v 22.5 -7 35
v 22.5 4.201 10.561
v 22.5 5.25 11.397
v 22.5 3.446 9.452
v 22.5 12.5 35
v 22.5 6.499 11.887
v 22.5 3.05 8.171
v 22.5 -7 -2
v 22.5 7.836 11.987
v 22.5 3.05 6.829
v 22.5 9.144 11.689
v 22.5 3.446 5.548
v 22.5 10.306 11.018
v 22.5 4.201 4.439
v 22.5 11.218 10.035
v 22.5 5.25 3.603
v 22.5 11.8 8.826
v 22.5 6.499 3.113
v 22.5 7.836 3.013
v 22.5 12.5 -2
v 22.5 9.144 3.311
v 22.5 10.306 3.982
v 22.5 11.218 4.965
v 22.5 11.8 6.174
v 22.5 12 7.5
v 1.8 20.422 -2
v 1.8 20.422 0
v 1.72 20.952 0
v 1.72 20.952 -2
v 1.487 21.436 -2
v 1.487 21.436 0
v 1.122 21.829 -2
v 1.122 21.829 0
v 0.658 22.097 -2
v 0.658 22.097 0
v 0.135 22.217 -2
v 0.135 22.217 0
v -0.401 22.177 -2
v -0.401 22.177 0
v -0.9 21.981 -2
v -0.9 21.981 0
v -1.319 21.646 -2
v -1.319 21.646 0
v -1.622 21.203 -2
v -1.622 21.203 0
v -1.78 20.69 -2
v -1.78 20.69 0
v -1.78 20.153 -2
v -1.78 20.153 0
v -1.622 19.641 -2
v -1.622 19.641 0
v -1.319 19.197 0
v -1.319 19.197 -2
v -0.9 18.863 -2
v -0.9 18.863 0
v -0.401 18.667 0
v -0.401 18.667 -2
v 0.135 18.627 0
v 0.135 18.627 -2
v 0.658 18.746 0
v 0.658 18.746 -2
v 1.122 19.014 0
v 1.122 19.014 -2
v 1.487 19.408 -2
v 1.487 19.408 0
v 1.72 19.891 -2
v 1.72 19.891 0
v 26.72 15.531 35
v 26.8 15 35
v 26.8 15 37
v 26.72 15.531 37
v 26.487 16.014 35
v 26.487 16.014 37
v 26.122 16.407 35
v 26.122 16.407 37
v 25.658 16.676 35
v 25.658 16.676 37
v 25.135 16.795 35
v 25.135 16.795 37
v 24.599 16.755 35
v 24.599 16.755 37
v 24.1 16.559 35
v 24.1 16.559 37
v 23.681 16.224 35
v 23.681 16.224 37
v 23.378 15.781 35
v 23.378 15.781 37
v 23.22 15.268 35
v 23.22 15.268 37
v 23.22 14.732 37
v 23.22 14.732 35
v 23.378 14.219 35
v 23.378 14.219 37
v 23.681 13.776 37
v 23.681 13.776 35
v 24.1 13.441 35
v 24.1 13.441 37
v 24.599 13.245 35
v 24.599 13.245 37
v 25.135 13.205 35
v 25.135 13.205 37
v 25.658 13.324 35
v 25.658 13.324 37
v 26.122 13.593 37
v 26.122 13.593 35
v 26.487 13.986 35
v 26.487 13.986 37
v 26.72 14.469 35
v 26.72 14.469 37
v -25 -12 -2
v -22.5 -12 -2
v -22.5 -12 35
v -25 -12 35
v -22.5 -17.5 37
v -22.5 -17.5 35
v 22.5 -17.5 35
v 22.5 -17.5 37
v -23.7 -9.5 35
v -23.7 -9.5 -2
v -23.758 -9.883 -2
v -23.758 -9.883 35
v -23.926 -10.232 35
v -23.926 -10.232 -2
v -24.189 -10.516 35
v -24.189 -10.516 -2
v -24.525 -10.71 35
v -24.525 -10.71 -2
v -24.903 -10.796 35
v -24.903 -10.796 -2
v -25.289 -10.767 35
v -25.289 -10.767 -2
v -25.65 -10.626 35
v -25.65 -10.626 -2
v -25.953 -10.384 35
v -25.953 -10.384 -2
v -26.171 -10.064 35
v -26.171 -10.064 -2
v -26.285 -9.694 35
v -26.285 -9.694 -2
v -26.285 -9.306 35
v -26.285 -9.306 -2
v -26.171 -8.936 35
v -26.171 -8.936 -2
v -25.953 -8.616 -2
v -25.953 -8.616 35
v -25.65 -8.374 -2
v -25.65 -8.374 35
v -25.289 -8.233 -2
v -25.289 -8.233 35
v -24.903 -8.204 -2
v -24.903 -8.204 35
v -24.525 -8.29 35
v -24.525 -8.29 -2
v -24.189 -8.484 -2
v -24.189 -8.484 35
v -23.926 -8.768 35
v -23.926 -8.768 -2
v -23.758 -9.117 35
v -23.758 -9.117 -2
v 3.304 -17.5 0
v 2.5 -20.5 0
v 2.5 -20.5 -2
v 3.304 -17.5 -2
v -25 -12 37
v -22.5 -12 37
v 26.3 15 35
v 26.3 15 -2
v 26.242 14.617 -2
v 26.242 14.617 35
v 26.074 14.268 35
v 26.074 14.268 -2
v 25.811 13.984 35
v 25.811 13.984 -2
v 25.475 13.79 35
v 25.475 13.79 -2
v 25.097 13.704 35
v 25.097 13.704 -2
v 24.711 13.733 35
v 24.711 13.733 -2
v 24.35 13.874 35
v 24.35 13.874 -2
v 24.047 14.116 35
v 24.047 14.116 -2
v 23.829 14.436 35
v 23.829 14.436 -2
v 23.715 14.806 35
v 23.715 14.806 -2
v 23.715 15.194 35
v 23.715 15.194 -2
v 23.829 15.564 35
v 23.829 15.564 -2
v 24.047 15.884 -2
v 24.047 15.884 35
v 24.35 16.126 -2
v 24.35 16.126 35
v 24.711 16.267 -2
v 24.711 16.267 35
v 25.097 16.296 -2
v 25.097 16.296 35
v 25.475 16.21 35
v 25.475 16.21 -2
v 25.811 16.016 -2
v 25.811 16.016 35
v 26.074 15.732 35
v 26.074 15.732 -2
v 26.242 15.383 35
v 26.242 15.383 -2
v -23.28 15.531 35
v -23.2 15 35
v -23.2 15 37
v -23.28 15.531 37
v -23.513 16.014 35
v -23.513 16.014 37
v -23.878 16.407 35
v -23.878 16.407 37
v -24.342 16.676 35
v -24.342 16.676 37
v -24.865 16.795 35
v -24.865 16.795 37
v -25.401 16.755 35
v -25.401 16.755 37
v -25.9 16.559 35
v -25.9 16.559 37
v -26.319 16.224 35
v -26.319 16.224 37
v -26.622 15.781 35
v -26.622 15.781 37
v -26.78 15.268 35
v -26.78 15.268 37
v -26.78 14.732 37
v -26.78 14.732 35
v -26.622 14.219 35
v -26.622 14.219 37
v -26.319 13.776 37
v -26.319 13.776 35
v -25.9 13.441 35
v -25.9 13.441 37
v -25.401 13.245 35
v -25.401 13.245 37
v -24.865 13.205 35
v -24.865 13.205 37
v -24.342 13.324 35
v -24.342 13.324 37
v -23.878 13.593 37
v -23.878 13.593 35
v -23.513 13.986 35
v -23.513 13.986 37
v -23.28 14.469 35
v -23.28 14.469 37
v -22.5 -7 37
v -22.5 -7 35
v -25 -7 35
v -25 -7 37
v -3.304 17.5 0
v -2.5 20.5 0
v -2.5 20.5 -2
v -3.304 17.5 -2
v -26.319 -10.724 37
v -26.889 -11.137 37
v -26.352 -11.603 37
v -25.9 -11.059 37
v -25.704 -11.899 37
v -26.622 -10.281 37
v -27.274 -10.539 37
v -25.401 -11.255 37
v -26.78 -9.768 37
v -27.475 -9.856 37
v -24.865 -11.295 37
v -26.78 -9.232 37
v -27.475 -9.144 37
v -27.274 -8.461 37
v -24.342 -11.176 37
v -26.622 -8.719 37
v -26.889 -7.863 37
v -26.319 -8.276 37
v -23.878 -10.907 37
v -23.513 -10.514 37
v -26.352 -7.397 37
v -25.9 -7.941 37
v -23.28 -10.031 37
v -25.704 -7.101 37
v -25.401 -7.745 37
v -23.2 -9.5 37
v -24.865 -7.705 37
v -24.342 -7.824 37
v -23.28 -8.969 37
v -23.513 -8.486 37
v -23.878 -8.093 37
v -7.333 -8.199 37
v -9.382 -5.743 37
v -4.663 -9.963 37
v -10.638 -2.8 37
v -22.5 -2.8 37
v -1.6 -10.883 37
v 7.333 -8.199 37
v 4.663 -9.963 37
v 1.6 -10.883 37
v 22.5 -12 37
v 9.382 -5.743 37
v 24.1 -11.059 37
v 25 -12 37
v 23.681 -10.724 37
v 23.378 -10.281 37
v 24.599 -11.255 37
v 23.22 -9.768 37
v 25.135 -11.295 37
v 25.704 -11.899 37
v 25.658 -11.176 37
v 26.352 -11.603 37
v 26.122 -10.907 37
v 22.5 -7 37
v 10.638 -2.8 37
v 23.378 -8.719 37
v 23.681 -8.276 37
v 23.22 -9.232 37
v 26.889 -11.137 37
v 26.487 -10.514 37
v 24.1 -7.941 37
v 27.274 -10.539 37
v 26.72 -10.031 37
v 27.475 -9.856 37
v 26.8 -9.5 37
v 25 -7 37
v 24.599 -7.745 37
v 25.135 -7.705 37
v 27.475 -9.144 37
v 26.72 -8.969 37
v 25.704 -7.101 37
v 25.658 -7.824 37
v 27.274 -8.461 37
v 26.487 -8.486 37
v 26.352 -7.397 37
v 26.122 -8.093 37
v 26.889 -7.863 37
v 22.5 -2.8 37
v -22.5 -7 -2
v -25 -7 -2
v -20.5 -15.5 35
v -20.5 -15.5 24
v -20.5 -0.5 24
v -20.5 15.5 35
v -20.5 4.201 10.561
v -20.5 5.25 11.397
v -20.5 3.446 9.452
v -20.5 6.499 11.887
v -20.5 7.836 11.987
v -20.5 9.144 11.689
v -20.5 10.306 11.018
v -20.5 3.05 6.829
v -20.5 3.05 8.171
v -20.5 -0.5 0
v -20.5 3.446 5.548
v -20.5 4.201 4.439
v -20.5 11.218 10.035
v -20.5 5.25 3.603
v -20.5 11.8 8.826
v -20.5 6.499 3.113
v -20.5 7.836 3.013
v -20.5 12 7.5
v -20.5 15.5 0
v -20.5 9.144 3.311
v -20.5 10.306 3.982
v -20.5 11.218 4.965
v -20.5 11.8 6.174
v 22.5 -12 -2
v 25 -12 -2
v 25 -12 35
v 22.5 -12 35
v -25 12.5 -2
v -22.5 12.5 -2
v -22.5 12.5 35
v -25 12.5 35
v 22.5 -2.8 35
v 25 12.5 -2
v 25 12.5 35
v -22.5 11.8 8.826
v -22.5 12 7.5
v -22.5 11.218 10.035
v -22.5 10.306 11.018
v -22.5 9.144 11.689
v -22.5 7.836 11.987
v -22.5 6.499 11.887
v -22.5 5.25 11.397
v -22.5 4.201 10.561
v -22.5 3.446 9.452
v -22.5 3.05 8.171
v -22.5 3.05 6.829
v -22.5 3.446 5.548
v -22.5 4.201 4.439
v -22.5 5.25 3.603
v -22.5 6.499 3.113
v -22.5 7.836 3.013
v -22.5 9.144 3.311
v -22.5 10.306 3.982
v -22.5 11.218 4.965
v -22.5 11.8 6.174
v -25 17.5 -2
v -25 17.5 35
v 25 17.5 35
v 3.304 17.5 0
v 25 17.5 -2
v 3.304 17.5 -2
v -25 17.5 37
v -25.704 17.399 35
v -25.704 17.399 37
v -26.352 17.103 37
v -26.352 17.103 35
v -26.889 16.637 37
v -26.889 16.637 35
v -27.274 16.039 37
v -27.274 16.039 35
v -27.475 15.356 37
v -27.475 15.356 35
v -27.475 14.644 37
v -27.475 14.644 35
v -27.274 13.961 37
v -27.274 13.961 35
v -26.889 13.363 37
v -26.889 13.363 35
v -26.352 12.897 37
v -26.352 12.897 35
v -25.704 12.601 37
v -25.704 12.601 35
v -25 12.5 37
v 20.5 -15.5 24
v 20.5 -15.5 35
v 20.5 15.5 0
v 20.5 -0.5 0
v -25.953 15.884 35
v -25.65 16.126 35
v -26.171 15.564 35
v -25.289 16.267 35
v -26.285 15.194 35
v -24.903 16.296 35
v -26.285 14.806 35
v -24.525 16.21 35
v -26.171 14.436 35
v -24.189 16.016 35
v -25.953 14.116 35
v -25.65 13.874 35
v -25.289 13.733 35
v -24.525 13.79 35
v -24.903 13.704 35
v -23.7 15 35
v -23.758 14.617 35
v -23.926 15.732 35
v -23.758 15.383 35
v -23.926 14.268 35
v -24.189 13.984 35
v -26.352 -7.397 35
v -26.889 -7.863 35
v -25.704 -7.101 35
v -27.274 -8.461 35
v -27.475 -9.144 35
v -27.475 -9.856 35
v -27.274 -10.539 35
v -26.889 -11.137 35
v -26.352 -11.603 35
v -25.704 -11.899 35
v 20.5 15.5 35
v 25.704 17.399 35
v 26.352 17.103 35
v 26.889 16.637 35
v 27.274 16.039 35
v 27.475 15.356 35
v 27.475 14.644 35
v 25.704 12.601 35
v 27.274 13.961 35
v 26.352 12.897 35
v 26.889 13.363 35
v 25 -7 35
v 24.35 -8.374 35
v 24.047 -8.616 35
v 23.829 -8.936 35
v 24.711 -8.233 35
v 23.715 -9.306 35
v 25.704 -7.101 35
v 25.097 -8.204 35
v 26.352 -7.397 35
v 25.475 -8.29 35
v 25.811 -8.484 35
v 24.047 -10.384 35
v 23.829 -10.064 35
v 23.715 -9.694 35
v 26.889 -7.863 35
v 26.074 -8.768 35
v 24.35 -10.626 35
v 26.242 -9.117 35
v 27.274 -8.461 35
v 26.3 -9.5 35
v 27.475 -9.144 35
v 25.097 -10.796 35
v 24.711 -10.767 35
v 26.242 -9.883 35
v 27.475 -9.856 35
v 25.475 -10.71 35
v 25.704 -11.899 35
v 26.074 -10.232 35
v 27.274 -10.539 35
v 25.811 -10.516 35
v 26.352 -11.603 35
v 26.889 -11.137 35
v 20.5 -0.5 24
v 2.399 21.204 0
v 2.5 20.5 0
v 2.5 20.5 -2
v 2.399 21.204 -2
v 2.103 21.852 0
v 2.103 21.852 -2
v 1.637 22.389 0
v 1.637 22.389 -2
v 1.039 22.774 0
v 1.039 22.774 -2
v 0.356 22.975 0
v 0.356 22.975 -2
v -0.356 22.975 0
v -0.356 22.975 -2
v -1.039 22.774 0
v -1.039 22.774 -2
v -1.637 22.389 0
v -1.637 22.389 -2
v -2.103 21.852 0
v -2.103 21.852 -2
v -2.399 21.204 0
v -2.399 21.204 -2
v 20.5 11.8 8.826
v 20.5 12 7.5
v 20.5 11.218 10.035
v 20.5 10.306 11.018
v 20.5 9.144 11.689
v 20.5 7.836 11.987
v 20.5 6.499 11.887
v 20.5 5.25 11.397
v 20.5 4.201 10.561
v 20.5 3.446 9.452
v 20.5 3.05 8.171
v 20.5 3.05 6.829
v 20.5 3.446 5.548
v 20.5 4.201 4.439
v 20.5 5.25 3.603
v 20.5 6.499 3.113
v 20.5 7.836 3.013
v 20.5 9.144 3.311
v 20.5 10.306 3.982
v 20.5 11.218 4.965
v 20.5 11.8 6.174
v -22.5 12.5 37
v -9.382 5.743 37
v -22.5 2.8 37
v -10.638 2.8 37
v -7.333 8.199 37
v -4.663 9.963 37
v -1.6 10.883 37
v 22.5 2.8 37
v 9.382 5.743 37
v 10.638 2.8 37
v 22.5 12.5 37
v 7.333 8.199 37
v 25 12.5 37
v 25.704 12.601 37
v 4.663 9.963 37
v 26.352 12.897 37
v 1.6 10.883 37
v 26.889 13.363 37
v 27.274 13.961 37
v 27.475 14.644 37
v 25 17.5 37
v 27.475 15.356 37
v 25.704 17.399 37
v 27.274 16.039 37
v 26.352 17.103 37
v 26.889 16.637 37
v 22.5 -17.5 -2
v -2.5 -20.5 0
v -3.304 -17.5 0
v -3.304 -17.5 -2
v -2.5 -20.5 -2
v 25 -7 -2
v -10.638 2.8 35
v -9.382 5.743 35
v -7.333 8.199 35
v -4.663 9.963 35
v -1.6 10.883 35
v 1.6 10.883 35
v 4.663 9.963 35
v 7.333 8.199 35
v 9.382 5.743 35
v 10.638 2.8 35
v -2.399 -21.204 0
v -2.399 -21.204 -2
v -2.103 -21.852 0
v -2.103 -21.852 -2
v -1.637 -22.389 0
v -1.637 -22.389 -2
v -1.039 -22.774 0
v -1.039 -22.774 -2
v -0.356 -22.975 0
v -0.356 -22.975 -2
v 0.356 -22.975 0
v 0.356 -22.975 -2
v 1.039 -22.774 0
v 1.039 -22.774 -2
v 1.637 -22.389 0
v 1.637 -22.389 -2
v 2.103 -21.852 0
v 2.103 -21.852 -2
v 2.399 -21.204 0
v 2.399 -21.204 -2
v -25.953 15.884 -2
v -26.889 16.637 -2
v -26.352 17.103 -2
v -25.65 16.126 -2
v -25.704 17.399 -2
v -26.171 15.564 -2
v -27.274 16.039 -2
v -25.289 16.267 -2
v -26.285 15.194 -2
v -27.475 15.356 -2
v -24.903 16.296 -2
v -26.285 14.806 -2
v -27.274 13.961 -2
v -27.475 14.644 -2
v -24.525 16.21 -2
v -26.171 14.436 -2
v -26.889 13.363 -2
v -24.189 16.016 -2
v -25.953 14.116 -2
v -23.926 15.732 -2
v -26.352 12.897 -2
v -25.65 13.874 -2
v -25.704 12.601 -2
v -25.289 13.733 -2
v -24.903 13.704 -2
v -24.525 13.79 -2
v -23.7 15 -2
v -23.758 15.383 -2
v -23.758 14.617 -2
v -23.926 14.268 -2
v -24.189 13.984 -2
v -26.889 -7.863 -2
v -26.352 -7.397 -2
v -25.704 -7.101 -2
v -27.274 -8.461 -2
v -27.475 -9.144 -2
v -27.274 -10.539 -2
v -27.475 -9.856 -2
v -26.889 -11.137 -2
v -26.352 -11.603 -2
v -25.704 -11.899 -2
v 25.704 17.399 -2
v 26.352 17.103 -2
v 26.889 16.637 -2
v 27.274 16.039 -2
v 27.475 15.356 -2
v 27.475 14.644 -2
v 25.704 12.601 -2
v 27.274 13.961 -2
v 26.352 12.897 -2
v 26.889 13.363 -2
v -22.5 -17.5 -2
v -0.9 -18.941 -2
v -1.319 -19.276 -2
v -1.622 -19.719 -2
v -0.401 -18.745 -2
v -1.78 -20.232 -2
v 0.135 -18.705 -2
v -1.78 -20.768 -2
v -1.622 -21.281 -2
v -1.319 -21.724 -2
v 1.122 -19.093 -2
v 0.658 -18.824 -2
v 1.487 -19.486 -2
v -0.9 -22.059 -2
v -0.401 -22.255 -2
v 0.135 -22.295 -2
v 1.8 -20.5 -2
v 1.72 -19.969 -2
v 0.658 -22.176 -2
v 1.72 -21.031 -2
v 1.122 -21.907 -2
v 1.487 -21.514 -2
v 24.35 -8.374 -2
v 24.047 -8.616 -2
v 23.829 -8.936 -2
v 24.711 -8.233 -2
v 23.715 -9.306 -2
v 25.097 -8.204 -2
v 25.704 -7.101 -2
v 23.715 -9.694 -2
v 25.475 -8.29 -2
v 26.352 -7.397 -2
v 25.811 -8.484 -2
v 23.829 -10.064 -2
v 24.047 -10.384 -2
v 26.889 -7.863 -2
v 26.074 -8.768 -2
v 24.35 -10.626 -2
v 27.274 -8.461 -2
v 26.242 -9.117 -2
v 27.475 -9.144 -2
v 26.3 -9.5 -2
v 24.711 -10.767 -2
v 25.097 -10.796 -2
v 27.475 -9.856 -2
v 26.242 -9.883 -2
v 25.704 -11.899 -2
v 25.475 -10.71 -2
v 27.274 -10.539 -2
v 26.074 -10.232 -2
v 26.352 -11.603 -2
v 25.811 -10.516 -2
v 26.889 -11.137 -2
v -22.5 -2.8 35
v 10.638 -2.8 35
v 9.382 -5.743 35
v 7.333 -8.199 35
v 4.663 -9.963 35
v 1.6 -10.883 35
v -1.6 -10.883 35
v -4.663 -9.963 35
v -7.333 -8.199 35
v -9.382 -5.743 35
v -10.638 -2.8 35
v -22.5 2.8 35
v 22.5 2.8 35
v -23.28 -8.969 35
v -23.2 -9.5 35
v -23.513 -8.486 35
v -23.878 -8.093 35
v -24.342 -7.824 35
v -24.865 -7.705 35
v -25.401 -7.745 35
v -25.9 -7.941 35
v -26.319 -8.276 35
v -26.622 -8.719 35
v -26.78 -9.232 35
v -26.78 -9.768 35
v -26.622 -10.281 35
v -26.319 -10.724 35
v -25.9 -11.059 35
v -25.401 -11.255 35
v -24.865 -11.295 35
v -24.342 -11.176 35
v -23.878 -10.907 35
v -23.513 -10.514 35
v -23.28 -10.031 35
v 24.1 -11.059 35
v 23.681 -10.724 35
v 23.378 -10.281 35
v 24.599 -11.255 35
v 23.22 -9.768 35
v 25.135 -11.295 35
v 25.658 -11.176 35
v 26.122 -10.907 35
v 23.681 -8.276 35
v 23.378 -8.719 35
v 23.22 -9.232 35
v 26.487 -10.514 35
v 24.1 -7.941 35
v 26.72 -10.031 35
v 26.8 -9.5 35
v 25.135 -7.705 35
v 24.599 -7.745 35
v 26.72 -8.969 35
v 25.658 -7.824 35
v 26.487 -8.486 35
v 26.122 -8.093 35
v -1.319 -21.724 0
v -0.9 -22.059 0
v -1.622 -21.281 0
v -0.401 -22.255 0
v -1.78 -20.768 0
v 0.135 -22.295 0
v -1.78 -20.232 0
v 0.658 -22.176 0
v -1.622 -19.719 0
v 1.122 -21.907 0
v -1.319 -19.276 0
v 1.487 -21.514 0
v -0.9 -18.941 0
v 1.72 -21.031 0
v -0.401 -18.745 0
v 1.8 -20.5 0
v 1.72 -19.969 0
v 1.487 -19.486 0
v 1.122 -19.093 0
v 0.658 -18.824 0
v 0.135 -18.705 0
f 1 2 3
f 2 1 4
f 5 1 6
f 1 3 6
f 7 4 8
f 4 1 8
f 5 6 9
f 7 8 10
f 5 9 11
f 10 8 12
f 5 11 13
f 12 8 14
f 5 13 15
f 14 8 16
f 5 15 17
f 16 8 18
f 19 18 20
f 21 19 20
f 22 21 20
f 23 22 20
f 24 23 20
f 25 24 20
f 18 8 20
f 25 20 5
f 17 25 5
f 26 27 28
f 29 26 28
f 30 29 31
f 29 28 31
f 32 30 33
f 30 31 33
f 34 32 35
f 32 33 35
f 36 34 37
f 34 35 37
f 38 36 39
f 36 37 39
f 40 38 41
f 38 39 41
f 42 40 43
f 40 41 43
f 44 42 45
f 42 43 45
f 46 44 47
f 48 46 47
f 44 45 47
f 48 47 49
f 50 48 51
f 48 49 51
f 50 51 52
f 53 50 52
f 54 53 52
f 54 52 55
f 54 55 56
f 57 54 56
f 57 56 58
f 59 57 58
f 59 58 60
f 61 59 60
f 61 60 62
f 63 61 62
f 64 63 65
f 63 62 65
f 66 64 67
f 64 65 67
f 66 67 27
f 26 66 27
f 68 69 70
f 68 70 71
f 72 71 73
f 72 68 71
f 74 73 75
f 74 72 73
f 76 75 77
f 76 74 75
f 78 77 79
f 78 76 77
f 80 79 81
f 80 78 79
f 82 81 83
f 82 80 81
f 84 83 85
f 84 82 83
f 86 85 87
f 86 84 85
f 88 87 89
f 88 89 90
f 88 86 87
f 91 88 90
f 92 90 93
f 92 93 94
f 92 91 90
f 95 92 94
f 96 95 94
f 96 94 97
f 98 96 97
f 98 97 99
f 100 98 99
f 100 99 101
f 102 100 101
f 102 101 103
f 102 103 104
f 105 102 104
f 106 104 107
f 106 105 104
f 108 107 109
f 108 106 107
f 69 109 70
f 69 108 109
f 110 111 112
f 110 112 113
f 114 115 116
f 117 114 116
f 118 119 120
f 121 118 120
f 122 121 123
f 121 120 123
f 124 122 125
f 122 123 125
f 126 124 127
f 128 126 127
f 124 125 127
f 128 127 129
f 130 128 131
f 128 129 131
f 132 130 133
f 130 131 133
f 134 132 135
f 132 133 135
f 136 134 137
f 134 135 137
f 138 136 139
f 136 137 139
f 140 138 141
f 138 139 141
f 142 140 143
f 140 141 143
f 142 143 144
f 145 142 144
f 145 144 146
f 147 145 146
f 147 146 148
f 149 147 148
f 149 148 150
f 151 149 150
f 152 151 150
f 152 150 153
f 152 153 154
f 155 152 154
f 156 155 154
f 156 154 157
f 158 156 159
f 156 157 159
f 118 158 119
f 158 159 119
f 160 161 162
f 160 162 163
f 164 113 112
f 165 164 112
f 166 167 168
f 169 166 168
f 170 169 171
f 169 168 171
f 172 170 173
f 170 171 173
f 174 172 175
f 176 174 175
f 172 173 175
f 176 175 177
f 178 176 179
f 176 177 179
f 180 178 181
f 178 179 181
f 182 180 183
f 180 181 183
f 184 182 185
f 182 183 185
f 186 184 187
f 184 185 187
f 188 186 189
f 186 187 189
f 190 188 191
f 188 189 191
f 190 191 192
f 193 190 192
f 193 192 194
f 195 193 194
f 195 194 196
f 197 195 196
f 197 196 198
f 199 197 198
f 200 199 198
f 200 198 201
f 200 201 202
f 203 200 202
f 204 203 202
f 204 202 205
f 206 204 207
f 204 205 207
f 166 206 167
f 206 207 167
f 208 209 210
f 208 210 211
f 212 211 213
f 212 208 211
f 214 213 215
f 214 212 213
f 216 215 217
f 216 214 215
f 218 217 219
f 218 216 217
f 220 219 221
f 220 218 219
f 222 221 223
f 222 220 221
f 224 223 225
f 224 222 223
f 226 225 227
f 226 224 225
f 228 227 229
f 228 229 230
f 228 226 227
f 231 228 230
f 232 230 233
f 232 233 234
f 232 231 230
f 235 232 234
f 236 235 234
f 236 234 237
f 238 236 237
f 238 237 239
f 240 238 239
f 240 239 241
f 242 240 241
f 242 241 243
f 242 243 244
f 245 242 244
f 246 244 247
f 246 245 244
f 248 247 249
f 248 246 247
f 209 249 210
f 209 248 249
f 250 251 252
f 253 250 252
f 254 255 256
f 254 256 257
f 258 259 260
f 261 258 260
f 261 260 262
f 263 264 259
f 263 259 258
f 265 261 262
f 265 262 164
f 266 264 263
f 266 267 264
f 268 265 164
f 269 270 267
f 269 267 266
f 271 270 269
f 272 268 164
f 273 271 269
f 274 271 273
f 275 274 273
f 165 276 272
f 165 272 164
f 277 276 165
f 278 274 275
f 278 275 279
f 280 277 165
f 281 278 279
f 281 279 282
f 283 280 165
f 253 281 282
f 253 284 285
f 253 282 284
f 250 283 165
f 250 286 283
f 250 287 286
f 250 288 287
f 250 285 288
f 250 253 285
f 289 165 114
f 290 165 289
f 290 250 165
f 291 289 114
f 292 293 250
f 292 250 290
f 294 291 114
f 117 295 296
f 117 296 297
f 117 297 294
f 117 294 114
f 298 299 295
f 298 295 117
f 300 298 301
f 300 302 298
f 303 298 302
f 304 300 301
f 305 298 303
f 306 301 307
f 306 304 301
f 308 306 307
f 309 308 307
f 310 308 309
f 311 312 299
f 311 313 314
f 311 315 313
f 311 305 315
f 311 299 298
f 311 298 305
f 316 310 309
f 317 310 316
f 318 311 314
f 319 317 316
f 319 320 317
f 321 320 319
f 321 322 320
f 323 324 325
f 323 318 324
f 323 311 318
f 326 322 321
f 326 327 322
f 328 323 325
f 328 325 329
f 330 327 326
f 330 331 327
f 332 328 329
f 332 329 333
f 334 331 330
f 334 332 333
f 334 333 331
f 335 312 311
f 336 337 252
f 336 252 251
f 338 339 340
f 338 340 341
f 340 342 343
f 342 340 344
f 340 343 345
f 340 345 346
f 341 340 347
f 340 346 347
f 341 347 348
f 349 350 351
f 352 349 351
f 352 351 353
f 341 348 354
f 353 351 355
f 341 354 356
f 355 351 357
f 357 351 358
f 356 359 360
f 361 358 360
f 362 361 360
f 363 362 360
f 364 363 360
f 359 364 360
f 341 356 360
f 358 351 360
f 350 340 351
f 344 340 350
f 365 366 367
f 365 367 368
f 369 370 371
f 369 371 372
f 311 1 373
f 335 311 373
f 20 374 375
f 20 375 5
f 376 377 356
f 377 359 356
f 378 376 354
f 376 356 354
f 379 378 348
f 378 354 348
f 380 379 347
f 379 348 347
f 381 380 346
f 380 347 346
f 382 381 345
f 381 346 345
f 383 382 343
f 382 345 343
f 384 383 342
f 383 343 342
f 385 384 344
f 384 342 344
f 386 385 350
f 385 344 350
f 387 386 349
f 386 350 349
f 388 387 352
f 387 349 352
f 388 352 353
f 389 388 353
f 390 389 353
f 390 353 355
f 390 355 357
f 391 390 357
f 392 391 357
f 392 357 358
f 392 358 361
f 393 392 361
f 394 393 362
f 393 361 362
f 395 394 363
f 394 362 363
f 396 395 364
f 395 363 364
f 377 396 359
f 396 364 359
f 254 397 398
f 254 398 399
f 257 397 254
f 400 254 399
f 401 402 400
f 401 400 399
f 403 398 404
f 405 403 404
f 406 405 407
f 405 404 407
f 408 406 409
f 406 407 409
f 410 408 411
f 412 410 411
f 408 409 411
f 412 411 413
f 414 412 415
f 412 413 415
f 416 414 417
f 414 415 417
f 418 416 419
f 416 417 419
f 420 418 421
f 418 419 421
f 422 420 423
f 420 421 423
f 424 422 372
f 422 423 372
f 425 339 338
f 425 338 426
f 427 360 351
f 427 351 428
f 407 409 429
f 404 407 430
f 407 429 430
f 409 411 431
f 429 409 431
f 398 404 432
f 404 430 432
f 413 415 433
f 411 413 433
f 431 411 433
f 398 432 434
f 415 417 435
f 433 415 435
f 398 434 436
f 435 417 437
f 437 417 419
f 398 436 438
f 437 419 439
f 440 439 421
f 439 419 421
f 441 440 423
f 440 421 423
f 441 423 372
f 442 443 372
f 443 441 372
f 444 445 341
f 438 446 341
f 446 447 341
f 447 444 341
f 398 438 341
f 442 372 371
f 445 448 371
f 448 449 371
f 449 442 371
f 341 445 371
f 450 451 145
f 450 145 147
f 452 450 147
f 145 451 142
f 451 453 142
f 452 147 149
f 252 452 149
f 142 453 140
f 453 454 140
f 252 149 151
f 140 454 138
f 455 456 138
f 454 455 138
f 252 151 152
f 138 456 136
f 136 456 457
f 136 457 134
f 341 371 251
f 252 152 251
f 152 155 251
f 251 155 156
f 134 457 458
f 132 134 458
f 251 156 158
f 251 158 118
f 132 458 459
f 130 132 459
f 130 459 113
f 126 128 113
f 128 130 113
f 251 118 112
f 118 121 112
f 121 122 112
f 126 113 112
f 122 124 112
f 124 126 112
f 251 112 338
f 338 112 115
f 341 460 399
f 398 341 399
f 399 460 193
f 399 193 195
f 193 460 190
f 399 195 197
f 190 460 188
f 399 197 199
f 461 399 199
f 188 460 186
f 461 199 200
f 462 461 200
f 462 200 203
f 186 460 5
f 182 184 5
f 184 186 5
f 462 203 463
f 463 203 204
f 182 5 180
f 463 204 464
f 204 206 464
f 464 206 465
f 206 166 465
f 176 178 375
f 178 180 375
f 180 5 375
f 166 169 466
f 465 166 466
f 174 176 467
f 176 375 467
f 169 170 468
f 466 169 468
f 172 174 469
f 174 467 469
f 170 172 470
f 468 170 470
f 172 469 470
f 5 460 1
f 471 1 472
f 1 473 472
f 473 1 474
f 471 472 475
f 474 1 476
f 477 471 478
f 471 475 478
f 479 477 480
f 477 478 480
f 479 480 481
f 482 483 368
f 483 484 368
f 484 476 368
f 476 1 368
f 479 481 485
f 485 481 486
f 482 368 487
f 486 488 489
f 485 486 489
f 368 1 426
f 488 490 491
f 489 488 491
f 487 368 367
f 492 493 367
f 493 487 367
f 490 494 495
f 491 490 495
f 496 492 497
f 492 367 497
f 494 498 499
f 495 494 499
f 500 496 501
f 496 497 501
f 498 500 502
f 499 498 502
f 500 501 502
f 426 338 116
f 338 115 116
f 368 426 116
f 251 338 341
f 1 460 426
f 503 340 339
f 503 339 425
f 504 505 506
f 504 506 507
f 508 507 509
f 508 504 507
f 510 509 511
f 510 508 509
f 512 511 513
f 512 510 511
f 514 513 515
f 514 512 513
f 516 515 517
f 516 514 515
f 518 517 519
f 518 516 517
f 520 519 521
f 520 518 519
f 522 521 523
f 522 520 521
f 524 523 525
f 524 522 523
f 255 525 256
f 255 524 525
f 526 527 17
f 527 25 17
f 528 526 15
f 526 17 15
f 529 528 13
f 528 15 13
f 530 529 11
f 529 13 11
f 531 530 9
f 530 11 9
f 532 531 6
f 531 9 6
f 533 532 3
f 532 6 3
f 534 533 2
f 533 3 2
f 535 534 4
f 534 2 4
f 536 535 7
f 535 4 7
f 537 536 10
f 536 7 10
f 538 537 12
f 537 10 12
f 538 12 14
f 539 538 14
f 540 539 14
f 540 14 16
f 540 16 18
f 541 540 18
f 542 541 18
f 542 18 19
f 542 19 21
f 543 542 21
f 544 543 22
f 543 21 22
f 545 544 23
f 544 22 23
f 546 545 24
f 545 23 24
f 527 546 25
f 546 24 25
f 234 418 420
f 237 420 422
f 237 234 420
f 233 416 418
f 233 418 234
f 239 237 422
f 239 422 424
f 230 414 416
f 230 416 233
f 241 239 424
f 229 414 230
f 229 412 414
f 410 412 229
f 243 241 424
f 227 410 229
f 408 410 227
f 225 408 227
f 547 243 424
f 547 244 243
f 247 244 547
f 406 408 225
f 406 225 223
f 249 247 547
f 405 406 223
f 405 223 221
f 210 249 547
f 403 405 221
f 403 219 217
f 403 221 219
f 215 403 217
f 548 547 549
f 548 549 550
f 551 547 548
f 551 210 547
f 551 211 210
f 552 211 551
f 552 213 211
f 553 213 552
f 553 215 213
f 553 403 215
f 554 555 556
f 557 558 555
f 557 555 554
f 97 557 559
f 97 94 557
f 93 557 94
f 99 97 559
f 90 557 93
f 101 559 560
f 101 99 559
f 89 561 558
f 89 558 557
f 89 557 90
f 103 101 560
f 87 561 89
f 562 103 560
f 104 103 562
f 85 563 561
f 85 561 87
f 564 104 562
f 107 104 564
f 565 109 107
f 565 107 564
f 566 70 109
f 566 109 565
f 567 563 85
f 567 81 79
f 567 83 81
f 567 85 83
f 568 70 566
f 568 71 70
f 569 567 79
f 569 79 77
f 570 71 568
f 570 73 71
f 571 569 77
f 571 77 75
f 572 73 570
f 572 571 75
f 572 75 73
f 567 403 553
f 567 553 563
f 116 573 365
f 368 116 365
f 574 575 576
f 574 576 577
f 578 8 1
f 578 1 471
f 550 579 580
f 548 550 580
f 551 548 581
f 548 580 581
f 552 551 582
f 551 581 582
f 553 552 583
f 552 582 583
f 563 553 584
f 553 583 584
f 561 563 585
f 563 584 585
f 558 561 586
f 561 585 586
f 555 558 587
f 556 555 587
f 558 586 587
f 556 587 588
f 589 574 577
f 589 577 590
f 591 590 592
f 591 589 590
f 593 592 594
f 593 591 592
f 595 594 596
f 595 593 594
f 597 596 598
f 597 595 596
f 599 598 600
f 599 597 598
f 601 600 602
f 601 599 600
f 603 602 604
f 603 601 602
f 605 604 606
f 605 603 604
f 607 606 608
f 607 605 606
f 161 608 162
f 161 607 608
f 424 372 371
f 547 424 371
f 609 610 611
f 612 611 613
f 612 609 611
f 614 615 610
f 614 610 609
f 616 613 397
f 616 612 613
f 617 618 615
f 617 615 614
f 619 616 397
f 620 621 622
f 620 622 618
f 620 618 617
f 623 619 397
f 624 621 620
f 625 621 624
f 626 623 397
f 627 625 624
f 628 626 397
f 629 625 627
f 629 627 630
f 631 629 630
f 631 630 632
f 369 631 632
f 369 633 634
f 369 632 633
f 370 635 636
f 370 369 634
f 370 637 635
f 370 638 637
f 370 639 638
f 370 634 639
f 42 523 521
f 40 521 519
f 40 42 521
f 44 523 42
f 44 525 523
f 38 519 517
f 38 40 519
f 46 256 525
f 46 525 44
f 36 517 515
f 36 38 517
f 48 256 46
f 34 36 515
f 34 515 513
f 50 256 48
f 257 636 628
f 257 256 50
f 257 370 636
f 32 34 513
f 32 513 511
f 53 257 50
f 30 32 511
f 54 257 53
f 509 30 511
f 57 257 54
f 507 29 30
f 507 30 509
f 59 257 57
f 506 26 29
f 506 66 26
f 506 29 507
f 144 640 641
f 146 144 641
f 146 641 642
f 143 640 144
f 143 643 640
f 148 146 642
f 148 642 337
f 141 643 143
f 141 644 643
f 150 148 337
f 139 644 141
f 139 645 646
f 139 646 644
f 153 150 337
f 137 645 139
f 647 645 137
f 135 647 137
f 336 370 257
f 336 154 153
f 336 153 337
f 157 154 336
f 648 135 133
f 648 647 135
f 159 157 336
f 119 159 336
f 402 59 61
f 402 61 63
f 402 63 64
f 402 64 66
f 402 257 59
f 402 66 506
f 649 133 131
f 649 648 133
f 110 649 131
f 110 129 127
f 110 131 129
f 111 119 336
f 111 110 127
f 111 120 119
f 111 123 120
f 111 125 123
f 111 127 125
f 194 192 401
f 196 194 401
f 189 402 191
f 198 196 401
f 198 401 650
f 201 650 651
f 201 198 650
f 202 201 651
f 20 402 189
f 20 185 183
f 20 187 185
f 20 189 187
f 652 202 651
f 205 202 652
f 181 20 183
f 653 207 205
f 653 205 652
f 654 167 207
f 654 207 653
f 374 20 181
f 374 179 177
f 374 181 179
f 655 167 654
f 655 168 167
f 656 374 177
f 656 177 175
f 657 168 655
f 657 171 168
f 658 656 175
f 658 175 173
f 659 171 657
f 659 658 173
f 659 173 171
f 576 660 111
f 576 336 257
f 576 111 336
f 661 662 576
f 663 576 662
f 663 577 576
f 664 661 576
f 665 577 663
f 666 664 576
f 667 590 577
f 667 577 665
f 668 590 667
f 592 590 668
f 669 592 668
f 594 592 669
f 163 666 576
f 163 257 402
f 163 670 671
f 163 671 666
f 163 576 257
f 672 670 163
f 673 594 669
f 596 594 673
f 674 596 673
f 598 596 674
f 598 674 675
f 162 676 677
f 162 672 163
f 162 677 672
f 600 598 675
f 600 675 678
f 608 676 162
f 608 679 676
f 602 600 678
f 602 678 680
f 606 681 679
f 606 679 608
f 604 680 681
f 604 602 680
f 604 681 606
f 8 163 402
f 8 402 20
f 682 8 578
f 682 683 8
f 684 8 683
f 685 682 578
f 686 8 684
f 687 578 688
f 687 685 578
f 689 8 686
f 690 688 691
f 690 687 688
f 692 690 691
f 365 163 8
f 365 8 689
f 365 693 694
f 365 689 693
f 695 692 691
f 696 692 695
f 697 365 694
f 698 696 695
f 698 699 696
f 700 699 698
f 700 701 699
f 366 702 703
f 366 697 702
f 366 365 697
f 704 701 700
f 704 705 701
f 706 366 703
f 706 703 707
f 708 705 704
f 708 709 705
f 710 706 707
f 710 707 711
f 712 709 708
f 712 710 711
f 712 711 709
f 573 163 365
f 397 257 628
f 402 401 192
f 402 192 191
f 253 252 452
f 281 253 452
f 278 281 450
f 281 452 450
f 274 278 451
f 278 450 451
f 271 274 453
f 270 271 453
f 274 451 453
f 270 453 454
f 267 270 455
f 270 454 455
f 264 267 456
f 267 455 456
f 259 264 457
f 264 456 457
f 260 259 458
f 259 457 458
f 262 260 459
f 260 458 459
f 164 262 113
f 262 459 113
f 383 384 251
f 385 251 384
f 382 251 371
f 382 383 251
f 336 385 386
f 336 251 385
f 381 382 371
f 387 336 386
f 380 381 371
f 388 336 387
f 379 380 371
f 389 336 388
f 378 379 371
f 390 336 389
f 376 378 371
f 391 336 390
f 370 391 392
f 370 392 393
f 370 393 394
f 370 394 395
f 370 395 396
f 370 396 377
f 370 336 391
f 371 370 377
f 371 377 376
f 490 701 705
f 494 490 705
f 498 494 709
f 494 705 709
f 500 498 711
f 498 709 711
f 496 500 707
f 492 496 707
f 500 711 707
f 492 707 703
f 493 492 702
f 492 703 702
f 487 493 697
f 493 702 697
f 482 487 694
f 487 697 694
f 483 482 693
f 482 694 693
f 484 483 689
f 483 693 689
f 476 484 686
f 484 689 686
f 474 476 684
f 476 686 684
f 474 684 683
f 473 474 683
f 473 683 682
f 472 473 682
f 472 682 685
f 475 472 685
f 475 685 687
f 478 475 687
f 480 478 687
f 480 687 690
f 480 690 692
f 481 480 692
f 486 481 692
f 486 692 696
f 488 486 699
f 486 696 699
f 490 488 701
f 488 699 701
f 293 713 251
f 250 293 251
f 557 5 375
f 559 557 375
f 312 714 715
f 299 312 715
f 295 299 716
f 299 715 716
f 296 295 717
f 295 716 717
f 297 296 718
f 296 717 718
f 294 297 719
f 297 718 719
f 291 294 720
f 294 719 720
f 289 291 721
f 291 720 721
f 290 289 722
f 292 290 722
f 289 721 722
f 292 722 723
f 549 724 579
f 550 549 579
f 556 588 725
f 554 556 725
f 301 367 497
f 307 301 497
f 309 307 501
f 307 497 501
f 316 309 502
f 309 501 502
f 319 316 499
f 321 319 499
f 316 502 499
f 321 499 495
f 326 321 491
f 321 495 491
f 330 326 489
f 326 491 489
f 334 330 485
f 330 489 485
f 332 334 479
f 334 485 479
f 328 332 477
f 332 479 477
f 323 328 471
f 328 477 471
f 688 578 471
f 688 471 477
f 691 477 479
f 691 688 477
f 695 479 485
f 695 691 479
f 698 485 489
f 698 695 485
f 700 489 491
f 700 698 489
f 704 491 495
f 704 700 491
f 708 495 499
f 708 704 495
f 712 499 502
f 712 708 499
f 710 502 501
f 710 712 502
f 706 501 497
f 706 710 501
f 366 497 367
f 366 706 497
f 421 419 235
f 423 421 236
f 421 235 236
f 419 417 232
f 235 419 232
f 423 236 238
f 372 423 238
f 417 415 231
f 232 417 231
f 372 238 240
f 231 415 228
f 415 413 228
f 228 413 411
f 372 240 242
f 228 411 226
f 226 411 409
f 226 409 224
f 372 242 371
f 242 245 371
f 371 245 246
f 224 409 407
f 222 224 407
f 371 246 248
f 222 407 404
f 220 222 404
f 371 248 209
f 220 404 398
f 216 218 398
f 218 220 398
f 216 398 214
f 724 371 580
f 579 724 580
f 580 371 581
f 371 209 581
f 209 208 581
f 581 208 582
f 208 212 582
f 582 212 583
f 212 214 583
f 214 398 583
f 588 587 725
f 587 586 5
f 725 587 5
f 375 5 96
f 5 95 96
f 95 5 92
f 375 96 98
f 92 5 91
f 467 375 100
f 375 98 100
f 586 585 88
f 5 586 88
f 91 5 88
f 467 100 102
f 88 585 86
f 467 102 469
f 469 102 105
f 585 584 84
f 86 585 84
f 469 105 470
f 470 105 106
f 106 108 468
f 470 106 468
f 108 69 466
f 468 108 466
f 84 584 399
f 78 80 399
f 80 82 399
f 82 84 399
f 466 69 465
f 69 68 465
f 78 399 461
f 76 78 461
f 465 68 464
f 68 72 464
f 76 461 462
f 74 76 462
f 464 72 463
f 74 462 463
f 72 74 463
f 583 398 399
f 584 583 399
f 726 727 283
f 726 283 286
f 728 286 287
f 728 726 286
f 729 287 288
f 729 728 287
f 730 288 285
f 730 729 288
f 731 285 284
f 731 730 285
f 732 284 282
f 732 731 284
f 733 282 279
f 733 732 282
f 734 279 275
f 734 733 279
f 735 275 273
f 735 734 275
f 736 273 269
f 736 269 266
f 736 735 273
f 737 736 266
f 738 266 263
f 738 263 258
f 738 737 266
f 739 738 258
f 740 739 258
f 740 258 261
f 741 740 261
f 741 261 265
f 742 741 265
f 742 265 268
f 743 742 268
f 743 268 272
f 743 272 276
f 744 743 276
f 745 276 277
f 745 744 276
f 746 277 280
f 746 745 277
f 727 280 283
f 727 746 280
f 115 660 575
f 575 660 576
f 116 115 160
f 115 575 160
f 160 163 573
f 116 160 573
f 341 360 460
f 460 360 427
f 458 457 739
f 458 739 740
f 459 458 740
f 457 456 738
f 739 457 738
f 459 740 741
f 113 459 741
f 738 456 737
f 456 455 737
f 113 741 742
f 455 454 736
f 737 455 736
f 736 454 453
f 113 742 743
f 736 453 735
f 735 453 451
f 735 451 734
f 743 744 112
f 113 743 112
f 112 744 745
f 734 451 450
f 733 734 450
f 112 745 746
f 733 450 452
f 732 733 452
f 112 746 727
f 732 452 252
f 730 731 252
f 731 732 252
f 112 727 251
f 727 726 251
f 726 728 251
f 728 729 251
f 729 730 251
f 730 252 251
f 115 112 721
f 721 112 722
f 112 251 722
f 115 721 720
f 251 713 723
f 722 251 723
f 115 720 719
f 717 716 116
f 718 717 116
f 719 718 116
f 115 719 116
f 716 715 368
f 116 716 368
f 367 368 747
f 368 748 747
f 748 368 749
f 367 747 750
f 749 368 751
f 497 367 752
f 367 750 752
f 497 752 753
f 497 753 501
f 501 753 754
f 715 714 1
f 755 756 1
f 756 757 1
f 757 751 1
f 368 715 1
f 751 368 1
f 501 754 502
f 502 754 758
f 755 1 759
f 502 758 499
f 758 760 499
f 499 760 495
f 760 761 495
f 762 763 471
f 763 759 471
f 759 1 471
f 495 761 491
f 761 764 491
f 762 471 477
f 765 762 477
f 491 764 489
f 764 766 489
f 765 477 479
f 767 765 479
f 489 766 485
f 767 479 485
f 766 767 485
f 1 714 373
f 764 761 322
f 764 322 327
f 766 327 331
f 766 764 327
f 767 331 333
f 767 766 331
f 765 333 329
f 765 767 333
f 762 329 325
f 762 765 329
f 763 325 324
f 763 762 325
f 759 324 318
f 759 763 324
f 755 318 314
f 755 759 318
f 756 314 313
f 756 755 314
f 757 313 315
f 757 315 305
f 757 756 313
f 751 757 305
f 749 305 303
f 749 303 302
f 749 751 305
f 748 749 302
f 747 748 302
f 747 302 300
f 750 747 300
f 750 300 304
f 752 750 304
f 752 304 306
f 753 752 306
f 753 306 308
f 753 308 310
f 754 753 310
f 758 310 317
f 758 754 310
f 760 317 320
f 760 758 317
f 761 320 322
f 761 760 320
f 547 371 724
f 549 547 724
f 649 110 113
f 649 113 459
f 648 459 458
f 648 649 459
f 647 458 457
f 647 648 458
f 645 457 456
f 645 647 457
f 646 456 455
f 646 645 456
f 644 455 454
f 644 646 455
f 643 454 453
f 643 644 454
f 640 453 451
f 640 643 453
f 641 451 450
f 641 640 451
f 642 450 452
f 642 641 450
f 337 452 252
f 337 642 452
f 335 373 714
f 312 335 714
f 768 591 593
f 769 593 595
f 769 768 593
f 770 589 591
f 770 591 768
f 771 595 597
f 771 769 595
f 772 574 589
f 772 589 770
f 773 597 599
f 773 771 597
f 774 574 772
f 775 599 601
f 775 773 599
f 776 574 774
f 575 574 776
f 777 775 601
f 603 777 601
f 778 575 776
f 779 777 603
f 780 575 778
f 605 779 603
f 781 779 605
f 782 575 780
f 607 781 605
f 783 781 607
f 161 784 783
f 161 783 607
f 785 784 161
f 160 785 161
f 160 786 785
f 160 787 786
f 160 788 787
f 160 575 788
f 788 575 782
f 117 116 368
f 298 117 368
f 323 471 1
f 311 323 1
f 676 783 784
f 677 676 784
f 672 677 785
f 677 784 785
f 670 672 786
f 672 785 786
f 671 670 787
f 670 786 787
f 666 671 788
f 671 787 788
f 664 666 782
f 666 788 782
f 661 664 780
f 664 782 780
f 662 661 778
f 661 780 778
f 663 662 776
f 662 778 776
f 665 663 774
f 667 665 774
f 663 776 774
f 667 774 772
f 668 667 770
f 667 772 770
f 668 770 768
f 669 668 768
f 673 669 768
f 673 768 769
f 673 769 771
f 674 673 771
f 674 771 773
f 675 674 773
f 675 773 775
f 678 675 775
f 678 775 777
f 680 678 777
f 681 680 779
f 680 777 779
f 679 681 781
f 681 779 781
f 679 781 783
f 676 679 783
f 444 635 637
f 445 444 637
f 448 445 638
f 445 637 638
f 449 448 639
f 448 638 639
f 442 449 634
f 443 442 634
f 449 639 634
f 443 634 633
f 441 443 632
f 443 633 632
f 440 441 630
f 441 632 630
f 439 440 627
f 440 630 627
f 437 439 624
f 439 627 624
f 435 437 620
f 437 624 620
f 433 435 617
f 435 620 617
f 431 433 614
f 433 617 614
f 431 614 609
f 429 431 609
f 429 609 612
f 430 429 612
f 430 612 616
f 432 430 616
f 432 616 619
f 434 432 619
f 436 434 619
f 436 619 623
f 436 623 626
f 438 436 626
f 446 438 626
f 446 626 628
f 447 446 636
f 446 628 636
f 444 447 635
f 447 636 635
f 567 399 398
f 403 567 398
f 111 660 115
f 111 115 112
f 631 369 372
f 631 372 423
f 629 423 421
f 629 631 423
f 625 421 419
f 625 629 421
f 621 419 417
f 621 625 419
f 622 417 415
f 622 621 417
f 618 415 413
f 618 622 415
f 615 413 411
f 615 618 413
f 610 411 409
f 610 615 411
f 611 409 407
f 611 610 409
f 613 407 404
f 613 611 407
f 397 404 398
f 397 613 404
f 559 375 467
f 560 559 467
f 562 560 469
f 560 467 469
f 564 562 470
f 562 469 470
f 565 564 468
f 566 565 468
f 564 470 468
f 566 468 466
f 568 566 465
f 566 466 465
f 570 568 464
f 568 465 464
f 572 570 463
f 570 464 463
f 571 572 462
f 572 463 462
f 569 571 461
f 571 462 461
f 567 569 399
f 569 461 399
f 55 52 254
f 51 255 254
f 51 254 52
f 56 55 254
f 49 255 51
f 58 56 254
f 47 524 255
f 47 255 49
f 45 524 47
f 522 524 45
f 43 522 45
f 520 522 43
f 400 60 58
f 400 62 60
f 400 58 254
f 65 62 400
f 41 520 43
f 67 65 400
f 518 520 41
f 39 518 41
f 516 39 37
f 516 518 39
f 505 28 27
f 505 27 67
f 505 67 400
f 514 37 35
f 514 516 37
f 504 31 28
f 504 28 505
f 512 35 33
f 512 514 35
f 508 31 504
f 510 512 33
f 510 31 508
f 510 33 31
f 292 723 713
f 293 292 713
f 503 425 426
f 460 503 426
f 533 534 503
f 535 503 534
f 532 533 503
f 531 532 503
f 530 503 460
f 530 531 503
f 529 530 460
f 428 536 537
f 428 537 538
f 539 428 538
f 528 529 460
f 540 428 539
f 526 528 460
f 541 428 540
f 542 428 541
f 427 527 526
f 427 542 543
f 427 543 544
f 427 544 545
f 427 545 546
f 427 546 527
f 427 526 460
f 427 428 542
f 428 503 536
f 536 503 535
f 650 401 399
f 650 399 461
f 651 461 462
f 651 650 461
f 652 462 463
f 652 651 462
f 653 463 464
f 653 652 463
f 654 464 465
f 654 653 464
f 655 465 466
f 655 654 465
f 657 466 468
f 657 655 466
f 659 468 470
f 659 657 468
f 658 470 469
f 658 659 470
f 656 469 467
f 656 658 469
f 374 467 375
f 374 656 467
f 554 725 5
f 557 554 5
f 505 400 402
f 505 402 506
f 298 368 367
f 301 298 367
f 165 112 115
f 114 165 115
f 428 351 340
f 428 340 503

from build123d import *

# Parameters (mm, degrees)
F0_W      = 45
F0_H      = 35
F0_W_2    = 41
F0_H_2    = 31
F1_DEPTH  = 2
F2_DEPTH  = 35
F3_W      = 41
F3_H      = 15
F4_DEPTH  = 24
F5_R      = 4.5
F6_DEPTH  = 25
F7_R      = 1.8
F8_DEPTH  = 2
F10_R     = 1.3
F11_DEPTH = 37
F12_R     = 1.8
F13_DEPTH = 2
F14_DEPTH = 2


with BuildPart() as f1:
    # F0 (on Top) → F1 (new body)
    with BuildSketch(Plane.XY):
        Rectangle(F0_W, F0_H)
        Rectangle(F0_W_2, F0_H_2, mode=Mode.SUBTRACT)
        Rectangle(F0_W_2, F0_H_2)
    extrude(amount=-F1_DEPTH)

    # F0 (on Top) → F2 (join)
    with BuildSketch(Plane.XY):
        Rectangle(F0_W, F0_H)
        Rectangle(F0_W_2, F0_H_2, mode=Mode.SUBTRACT)
    extrude(amount=F2_DEPTH)

    # F3 (on Top) → F4 (join)
    with BuildSketch(Plane.XY):
        with Locations((0, -8)):
            Rectangle(F3_W, F3_H)
    extrude(amount=F4_DEPTH)

    # F5 (on Right) → F6 (cut, symmetric)
    with BuildSketch(Plane.YZ):
        with Locations((7.5, 7.5)):
            Circle(F5_R)
    extrude(amount=F6_DEPTH, both=True, mode=Mode.SUBTRACT)

    # F7 (on Top) → F8 (join)
    with BuildSketch(Plane.XY):
        with BuildLine():
            Line((-3.3038475773, -17.5), (-2.5, -20.5))
            ThreePointArc((-2.5, -20.5), (0, -23), (2.5, -20.5))
            Line((2.5, -20.5), (3.3038475773, -17.5))
            Line((3.3038475773, -17.5), (-3.3038475773, -17.5))
        make_face()
        with Locations((0, -20.5)):
            Circle(F7_R, mode=Mode.SUBTRACT)
        with BuildLine():
            Line((3.3038475773, 17.5), (2.5, 20.5))
            ThreePointArc((2.5, 20.5), (0, 23), (-2.5, 20.5))
            Line((-2.5, 20.5), (-3.3038475773, 17.5))
            Line((-3.3038475773, 17.5), (3.3038475773, 17.5))
        make_face()
        with Locations((0, 20.4217750579)):
            Circle(F7_R, mode=Mode.SUBTRACT)
    extrude(amount=-F8_DEPTH)

    # F10 (on face) → F11 (join, through all)
    with BuildSketch(Plane(origin=(0, 0, -2), x_dir=(1, 0, 0), z_dir=(0, 0, -1))):
        with BuildLine():
            Line((-22.5, -12.5), (-25, -12.5))
            ThreePointArc((-25, -12.5), (-27.5, -15), (-25, -17.5))
            Line((-25, -17.5), (-22.5, -17.5))
            Line((-22.5, -17.5), (-22.5, -12.5))
        make_face()
        with Locations((-25, -15)):
            Circle(F10_R, mode=Mode.SUBTRACT)
        with BuildLine():
            Line((22.5, -12.5), (22.5, -17.5))
            Line((22.5, -17.5), (25, -17.5))
            ThreePointArc((25, -17.5), (27.5, -15), (25, -12.5))
            Line((25, -12.5), (22.5, -12.5))
        make_face()
        with Locations((25, -15)):
            Circle(F10_R, mode=Mode.SUBTRACT)
        with BuildLine():
            Line((22.5, 12), (22.5, 7))
            Line((22.5, 7), (25, 7))
            ThreePointArc((25, 7), (27.5, 9.5), (25, 12))
            Line((25, 12), (22.5, 12))
        make_face()
        with Locations((25, 9.5)):
            Circle(F10_R, mode=Mode.SUBTRACT)
        with BuildLine():
            Line((-25, 7), (-22.5, 7))
            Line((-22.5, 7), (-22.5, 12))
            Line((-22.5, 12), (-25, 12))
            ThreePointArc((-25, 12), (-27.5, 9.5), (-25, 7))
        make_face()
        with Locations((-25, 9.5)):
            Circle(F10_R, mode=Mode.SUBTRACT)
    extrude(amount=-F11_DEPTH)


with BuildPart() as f13:
    # F12 (on face) → F13 (new body)
    with BuildSketch(Plane.XY.offset(35)):
        with BuildLine():
            Line((-25, 12.5), (-22.5, 12.5))
            Line((-22.5, 12.5), (-22.5, 17.5))
            Line((-22.5, 17.5), (-25, 17.5))
            ThreePointArc((-25, 17.5), (-27.5, 15), (-25, 12.5))
        make_face()
        with Locations((-25, 15)):
            Circle(F12_R, mode=Mode.SUBTRACT)
        Polygon((-22.5, 12.5), (-22.5, 2.8), (-20.5, 2.8), (-20.5, 15.5), (20.5, 15.5), (20.5, 2.8), (22.5, 2.8), (22.5, 12.5), (22.5, 17.5), (-22.5, 17.5), align=None)
        with BuildLine():
            Line((-20.5, 15.5), (-20.5, 2.8))
            Line((-20.5, 2.8), (-10.6376689176, 2.8))
            ThreePointArc((-10.6376689176, 2.8), (0, 11), (10.6376689176, 2.8))
            Line((10.6376689176, 2.8), (20.5, 2.8))
            Line((20.5, 2.8), (20.5, 15.5))
            Line((20.5, 15.5), (-20.5, 15.5))
        make_face()
        with BuildLine():
            Line((22.5, 17.5), (22.5, 12.5))
            Line((22.5, 12.5), (25, 12.5))
            ThreePointArc((25, 12.5), (27.5, 15), (25, 17.5))
            Line((25, 17.5), (22.5, 17.5))
        make_face()
        with Locations((25, 15)):
            Circle(F12_R, mode=Mode.SUBTRACT)
    extrude(amount=F13_DEPTH)


with BuildPart() as f14:
    # F12 (on face) → F14 (new body)
    with BuildSketch(Plane.XY.offset(35)):
        with BuildLine():
            Line((-10.6376689176, -2.8), (-20.5, -2.8))
            Line((-20.5, -2.8), (-20.5, -15.5))
            Line((-20.5, -15.5), (20.5, -15.5))
            Line((20.5, -15.5), (20.5, -2.8))
            Line((20.5, -2.8), (10.6376689176, -2.8))
            ThreePointArc((10.6376689176, -2.8), (0, -11), (-10.6376689176, -2.8))
        make_face()
        Polygon((-22.5, -12), (-22.5, -17.5), (22.5, -17.5), (22.5, -12), (22.5, -7), (22.5, -2.8), (20.5, -2.8), (20.5, -15.5), (-20.5, -15.5), (-20.5, -2.8), (-22.5, -2.8), (-22.5, -7), align=None)
        with BuildLine():
            Line((-25, -12), (-22.5, -12))
            Line((-22.5, -12), (-22.5, -7))
            Line((-22.5, -7), (-25, -7))
            ThreePointArc((-25, -7), (-27.5, -9.5), (-25, -12))
        make_face()
        with Locations((-25, -9.5)):
            Circle(F12_R, mode=Mode.SUBTRACT)
        with BuildLine():
            Line((22.5, -7), (22.5, -12))
            Line((22.5, -12), (25, -12))
            ThreePointArc((25, -12), (27.5, -9.5), (25, -7))
            Line((25, -7), (22.5, -7))
        make_face()
        with Locations((25, -9.5)):
            Circle(F12_R, mode=Mode.SUBTRACT)
    extrude(amount=F14_DEPTH)


solid = Compound([f1.part, f13.part, f14.part])
